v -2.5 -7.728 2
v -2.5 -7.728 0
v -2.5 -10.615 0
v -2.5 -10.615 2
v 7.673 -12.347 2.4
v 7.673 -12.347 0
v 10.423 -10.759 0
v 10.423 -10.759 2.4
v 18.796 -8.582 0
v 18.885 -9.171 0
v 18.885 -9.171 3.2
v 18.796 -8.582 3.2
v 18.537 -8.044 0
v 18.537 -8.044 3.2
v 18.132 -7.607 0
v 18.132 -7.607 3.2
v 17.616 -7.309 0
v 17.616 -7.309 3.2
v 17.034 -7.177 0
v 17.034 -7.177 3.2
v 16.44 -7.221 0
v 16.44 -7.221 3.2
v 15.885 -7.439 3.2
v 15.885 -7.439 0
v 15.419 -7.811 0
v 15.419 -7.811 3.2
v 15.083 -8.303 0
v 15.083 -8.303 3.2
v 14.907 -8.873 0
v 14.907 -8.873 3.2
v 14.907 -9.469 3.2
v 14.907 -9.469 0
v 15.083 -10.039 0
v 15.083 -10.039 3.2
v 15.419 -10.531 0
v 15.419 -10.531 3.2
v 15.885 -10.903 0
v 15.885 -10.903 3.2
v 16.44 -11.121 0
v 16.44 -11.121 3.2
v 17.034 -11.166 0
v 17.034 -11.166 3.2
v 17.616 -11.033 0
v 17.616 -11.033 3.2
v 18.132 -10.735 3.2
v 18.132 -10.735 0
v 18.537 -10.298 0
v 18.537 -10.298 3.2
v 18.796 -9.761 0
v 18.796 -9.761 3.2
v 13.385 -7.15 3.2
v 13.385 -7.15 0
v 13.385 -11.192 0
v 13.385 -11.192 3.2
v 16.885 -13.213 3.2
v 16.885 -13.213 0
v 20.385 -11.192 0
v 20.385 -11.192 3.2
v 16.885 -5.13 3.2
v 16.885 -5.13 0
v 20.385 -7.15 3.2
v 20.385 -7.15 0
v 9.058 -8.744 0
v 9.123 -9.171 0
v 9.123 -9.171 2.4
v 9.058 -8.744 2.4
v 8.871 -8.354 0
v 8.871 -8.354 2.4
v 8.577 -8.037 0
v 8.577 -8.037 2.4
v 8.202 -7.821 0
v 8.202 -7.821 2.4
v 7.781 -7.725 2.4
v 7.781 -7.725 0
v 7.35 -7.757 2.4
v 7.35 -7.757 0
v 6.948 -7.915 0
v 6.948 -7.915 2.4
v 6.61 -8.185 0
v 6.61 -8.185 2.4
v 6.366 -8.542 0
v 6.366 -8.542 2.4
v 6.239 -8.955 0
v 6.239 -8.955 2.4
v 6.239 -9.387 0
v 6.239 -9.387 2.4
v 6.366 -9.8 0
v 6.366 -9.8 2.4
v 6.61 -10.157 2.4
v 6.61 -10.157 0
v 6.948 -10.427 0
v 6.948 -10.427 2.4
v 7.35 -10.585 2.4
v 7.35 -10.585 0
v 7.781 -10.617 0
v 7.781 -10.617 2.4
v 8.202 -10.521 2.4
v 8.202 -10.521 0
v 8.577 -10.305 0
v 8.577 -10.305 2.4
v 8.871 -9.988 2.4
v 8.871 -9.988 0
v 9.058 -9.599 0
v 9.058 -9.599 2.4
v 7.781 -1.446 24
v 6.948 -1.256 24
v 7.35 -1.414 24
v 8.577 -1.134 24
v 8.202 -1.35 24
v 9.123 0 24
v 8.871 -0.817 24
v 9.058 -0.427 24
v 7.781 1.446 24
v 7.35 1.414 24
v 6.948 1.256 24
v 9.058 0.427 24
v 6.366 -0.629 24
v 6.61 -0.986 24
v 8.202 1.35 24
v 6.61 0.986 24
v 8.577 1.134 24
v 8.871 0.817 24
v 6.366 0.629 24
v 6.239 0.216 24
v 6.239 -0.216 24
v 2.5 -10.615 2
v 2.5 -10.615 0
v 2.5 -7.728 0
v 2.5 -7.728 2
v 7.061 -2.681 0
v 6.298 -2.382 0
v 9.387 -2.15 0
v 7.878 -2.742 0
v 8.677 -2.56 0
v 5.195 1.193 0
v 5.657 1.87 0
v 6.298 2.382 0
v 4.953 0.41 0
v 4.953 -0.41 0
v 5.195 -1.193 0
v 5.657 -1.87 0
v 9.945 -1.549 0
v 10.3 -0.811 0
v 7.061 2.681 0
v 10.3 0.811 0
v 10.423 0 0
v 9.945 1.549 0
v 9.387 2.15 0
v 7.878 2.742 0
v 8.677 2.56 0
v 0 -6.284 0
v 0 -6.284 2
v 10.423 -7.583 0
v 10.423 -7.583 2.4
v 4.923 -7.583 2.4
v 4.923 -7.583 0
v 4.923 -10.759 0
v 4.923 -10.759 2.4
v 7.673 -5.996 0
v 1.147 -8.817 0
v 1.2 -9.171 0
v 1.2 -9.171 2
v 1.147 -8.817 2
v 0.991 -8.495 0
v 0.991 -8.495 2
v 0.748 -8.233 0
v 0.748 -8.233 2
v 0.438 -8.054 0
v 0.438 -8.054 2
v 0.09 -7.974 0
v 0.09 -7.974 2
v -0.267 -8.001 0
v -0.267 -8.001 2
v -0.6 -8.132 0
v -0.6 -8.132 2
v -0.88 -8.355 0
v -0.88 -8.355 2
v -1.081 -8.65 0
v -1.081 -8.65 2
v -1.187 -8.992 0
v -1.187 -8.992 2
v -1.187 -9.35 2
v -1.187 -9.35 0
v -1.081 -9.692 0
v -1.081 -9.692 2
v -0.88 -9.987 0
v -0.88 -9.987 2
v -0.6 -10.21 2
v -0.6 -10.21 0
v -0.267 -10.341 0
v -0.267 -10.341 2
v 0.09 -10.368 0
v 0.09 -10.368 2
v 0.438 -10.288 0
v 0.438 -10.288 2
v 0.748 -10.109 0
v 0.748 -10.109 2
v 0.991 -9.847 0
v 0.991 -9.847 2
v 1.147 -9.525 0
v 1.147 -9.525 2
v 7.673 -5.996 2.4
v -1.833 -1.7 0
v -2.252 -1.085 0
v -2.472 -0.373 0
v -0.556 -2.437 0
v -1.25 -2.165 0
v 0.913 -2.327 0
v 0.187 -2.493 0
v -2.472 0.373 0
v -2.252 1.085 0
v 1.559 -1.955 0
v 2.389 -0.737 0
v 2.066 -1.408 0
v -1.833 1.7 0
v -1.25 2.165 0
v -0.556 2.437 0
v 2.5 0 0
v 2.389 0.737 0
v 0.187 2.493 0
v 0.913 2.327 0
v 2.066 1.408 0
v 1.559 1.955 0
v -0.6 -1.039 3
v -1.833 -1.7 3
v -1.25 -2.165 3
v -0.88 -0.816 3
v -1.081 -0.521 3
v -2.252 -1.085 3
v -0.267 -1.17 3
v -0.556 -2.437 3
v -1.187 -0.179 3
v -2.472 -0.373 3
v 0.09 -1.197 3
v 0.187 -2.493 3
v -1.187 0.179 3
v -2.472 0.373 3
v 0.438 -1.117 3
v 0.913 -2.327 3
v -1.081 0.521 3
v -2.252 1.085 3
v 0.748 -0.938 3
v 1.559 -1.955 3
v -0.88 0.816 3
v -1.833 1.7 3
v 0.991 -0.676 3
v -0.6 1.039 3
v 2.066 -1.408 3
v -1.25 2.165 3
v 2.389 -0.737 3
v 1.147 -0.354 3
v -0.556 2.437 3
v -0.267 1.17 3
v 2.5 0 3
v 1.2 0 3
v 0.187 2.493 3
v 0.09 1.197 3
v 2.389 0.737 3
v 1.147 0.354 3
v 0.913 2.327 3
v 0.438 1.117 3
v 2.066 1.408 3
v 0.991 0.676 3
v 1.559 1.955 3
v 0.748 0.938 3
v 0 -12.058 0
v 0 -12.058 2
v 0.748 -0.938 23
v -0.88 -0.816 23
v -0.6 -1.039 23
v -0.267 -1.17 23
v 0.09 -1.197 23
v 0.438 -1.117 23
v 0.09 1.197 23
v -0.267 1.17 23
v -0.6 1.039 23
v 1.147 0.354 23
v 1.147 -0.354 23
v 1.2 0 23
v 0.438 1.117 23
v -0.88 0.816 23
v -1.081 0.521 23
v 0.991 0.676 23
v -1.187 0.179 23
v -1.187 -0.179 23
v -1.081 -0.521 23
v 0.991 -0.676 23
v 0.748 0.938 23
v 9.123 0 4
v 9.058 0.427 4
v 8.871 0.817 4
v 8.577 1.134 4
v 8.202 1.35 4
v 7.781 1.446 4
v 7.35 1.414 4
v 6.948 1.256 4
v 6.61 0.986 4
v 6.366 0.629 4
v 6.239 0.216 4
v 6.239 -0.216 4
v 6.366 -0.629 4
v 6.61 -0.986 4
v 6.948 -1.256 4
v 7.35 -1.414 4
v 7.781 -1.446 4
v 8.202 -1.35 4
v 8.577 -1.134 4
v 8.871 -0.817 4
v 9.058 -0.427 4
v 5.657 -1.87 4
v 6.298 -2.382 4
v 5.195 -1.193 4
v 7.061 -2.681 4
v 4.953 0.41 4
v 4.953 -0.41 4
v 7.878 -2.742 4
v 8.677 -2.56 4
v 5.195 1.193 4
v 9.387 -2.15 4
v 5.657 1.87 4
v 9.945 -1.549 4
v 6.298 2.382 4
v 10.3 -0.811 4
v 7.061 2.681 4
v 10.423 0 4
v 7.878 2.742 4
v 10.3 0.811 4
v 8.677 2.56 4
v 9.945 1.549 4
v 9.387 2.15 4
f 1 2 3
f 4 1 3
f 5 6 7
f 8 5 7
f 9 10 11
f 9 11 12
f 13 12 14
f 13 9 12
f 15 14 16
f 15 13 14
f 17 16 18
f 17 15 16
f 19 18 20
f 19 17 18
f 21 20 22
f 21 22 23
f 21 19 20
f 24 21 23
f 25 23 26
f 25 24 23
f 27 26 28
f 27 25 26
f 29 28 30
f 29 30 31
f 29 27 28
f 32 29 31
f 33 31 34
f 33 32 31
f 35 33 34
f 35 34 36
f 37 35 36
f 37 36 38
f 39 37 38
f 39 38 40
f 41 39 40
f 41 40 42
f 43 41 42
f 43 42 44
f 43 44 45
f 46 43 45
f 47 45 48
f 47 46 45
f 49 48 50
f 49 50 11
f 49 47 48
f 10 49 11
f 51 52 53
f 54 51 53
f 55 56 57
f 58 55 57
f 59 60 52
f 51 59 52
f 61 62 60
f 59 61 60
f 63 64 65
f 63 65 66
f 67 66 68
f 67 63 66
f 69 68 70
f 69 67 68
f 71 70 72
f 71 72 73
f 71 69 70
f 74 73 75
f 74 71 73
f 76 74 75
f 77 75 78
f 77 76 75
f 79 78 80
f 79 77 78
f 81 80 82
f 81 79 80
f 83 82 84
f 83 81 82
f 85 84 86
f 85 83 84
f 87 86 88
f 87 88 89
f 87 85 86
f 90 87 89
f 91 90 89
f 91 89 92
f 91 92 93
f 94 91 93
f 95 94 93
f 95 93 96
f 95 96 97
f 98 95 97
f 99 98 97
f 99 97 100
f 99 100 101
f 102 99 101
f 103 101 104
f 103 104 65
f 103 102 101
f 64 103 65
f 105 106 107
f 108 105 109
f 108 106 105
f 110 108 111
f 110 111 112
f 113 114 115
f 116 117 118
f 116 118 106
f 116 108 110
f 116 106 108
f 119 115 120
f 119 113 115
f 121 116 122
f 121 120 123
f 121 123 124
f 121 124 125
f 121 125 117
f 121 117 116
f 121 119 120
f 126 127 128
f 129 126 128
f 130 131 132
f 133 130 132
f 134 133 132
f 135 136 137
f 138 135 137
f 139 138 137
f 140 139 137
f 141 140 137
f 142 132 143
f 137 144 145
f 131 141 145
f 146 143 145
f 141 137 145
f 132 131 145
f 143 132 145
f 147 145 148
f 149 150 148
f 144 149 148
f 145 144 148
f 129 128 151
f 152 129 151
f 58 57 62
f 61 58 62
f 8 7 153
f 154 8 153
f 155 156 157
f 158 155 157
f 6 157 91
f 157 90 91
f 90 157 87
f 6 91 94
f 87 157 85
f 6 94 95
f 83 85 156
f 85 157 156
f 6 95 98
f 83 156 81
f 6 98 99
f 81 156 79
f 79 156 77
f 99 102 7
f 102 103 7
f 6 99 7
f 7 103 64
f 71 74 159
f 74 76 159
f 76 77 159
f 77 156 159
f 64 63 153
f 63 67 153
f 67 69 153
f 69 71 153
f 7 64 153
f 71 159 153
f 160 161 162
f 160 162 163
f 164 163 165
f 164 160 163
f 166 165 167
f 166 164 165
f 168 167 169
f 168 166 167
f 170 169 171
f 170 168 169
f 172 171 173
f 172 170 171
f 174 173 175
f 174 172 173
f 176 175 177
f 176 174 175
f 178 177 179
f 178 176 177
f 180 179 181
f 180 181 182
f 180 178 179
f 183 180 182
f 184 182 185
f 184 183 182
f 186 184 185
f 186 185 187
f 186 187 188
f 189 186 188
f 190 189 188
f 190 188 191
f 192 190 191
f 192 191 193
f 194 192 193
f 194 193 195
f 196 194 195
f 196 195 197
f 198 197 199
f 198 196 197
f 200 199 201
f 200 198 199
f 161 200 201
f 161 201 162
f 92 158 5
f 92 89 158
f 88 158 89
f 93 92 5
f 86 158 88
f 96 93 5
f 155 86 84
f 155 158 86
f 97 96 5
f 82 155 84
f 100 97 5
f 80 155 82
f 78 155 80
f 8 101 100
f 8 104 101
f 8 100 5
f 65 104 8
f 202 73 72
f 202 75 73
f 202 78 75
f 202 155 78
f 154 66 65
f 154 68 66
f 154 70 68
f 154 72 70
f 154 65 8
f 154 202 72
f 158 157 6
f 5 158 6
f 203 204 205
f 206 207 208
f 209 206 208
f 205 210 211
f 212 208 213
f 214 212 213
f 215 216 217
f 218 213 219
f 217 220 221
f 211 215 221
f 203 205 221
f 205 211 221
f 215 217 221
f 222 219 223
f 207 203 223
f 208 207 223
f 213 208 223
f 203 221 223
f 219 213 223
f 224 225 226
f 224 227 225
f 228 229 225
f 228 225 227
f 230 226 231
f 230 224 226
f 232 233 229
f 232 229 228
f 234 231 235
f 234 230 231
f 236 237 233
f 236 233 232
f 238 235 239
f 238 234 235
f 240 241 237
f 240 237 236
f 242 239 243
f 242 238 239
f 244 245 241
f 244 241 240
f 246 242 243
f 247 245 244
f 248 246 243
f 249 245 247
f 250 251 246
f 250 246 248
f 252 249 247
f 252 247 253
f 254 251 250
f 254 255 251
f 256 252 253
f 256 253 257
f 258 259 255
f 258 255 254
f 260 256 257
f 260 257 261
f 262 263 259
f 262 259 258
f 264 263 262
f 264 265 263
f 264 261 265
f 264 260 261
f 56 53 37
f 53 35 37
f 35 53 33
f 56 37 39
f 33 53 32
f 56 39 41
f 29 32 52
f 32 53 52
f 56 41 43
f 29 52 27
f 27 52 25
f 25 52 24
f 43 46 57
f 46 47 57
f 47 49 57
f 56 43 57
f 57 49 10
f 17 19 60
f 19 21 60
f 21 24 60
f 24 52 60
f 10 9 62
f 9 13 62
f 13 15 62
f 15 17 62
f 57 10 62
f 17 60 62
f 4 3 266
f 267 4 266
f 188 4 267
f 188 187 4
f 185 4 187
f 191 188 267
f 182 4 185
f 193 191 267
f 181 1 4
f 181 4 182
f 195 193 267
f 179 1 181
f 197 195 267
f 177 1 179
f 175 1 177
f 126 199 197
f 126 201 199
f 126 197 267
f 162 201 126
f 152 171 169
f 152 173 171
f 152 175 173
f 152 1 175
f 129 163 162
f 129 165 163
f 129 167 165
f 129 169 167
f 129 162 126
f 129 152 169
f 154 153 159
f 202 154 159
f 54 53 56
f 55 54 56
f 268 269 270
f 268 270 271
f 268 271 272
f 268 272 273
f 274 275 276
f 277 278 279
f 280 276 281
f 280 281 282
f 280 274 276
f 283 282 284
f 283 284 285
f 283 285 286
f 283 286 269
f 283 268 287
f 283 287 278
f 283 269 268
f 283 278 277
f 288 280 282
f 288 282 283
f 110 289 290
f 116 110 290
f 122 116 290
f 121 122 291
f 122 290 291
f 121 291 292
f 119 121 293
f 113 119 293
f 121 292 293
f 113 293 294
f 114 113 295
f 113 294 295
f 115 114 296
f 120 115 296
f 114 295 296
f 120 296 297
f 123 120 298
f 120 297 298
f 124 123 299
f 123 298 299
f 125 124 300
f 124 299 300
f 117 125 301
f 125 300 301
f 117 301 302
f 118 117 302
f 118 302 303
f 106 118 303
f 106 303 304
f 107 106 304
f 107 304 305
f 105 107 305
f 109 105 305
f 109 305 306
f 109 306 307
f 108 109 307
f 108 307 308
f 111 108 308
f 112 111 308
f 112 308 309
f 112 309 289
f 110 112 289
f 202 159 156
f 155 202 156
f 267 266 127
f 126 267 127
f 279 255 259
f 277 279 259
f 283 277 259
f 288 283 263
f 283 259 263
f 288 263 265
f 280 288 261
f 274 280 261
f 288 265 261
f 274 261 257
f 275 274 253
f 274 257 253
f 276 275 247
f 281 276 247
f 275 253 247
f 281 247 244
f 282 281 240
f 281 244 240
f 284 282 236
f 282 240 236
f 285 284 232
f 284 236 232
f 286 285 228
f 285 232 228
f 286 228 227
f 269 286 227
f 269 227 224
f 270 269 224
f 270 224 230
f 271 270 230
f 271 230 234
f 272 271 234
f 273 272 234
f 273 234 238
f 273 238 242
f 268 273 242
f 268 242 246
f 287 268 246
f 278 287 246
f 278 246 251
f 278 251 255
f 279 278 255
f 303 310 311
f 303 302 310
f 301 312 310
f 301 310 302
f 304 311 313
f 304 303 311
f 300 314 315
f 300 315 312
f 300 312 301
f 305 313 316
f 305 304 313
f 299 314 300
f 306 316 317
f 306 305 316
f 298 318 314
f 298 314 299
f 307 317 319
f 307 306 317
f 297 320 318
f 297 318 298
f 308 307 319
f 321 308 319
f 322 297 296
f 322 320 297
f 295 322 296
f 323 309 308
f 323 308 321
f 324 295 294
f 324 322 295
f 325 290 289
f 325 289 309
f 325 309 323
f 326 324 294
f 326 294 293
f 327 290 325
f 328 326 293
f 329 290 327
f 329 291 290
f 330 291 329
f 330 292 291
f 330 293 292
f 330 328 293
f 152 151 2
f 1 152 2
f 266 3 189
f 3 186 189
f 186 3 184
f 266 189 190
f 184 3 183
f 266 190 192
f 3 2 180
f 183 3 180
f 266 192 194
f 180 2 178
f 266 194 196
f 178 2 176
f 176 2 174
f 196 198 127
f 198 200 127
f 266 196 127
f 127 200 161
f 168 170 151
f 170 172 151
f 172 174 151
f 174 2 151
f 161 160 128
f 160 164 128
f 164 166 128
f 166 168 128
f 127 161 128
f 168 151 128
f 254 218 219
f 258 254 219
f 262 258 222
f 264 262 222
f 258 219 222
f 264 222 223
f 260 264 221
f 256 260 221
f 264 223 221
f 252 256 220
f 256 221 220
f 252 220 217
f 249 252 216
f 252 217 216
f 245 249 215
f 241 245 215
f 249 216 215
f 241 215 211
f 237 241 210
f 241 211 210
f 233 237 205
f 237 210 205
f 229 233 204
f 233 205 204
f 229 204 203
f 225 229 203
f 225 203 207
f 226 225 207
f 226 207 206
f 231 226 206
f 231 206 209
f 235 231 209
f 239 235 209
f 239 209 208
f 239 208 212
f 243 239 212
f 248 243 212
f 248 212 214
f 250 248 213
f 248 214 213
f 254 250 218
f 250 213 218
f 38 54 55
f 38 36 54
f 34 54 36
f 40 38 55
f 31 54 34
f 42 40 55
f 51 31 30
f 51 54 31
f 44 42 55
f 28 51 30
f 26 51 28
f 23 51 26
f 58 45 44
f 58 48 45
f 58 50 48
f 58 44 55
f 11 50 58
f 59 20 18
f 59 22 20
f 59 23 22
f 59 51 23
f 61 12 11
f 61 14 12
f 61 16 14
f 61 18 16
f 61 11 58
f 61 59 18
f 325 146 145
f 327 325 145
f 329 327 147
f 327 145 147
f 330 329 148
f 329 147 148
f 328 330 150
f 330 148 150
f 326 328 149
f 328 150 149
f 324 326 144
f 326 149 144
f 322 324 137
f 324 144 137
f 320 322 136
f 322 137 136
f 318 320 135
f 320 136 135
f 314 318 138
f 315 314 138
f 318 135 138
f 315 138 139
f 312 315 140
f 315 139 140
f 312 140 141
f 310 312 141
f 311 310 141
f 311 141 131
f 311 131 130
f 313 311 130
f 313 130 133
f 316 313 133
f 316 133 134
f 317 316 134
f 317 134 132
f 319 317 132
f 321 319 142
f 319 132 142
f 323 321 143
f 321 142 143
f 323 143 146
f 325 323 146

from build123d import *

# Parameters (mm, degrees)
F0_R     = 1.2
F1_DEPTH = 2
F2_DEPTH = 23
F0_R_2   = 2.5
F3_DEPTH = 3
F0_R_3   = 1.45
F4_DEPTH = 2.4
F5_DEPTH = 24
F0_R_4   = 2.75
F6_DEPTH = 4
F0_R_5   = 2
F7_DEPTH = 3.2


with BuildPart() as f1:
    # F0 (on Top) → F1 (new body)
    with BuildSketch(Plane.XY):
        Polygon((2.5, -10.614515), (2.5, -7.727764), (0, -6.284388), (-2.5, -7.727764), (-2.5, -10.614515), (0, -12.057891), align=None)
        with Locations((0, -9.17114)):
            Circle(F0_R, mode=Mode.SUBTRACT)
    extrude(amount=F1_DEPTH)


with BuildPart() as f2:
    # F0 (on Top) → F2 (new body)
    with BuildSketch(Plane.XY):
        Circle(F0_R)
    extrude(amount=F2_DEPTH)

    # F0 (on Top) → F3 (join)
    with BuildSketch(Plane.XY):
        Circle(F0_R_2)
        Circle(F0_R, mode=Mode.SUBTRACT)
    extrude(amount=F3_DEPTH)


with BuildPart() as f4:
    # F0 (on Top) → F4 (new body)
    with BuildSketch(Plane.XY):
        Polygon((10.422505, -10.758853), (10.422505, -7.583427), (7.672505, -5.995713), (4.922505, -7.583427), (4.922505, -10.758853), (7.672505, -12.346566), align=None)
        with Locations((7.672505, -9.17114)):
            Circle(F0_R_3, mode=Mode.SUBTRACT)
    extrude(amount=F4_DEPTH)


with BuildPart() as f5:
    # F0 (on Top) → F5 (new body)
    with BuildSketch(Plane.XY):
        with Locations((7.672505, 0)):
            Circle(F0_R_3)
    extrude(amount=F5_DEPTH)

    # F0 (on Top) → F6 (join)
    with BuildSketch(Plane.XY):
        with Locations((7.672505, 0)):
            Circle(F0_R_4)
        with Locations((7.672505, 0)):
            Circle(F0_R_3, mode=Mode.SUBTRACT)
    extrude(amount=F6_DEPTH)


with BuildPart() as f7:
    # F0 (on Top) → F7 (new body)
    with BuildSketch(Plane.XY):
        Polygon((20.38488, -11.191866), (20.38488, -7.150414), (16.88488, -5.129688), (13.38488, -7.150414), (13.38488, -11.191866), (16.88488, -13.212592), align=None)
        with Locations((16.88488, -9.17114)):
            Circle(F0_R_5, mode=Mode.SUBTRACT)
    extrude(amount=F7_DEPTH)


solid = Compound([f1.part, f2.part, f4.part, f5.part, f7.part])
